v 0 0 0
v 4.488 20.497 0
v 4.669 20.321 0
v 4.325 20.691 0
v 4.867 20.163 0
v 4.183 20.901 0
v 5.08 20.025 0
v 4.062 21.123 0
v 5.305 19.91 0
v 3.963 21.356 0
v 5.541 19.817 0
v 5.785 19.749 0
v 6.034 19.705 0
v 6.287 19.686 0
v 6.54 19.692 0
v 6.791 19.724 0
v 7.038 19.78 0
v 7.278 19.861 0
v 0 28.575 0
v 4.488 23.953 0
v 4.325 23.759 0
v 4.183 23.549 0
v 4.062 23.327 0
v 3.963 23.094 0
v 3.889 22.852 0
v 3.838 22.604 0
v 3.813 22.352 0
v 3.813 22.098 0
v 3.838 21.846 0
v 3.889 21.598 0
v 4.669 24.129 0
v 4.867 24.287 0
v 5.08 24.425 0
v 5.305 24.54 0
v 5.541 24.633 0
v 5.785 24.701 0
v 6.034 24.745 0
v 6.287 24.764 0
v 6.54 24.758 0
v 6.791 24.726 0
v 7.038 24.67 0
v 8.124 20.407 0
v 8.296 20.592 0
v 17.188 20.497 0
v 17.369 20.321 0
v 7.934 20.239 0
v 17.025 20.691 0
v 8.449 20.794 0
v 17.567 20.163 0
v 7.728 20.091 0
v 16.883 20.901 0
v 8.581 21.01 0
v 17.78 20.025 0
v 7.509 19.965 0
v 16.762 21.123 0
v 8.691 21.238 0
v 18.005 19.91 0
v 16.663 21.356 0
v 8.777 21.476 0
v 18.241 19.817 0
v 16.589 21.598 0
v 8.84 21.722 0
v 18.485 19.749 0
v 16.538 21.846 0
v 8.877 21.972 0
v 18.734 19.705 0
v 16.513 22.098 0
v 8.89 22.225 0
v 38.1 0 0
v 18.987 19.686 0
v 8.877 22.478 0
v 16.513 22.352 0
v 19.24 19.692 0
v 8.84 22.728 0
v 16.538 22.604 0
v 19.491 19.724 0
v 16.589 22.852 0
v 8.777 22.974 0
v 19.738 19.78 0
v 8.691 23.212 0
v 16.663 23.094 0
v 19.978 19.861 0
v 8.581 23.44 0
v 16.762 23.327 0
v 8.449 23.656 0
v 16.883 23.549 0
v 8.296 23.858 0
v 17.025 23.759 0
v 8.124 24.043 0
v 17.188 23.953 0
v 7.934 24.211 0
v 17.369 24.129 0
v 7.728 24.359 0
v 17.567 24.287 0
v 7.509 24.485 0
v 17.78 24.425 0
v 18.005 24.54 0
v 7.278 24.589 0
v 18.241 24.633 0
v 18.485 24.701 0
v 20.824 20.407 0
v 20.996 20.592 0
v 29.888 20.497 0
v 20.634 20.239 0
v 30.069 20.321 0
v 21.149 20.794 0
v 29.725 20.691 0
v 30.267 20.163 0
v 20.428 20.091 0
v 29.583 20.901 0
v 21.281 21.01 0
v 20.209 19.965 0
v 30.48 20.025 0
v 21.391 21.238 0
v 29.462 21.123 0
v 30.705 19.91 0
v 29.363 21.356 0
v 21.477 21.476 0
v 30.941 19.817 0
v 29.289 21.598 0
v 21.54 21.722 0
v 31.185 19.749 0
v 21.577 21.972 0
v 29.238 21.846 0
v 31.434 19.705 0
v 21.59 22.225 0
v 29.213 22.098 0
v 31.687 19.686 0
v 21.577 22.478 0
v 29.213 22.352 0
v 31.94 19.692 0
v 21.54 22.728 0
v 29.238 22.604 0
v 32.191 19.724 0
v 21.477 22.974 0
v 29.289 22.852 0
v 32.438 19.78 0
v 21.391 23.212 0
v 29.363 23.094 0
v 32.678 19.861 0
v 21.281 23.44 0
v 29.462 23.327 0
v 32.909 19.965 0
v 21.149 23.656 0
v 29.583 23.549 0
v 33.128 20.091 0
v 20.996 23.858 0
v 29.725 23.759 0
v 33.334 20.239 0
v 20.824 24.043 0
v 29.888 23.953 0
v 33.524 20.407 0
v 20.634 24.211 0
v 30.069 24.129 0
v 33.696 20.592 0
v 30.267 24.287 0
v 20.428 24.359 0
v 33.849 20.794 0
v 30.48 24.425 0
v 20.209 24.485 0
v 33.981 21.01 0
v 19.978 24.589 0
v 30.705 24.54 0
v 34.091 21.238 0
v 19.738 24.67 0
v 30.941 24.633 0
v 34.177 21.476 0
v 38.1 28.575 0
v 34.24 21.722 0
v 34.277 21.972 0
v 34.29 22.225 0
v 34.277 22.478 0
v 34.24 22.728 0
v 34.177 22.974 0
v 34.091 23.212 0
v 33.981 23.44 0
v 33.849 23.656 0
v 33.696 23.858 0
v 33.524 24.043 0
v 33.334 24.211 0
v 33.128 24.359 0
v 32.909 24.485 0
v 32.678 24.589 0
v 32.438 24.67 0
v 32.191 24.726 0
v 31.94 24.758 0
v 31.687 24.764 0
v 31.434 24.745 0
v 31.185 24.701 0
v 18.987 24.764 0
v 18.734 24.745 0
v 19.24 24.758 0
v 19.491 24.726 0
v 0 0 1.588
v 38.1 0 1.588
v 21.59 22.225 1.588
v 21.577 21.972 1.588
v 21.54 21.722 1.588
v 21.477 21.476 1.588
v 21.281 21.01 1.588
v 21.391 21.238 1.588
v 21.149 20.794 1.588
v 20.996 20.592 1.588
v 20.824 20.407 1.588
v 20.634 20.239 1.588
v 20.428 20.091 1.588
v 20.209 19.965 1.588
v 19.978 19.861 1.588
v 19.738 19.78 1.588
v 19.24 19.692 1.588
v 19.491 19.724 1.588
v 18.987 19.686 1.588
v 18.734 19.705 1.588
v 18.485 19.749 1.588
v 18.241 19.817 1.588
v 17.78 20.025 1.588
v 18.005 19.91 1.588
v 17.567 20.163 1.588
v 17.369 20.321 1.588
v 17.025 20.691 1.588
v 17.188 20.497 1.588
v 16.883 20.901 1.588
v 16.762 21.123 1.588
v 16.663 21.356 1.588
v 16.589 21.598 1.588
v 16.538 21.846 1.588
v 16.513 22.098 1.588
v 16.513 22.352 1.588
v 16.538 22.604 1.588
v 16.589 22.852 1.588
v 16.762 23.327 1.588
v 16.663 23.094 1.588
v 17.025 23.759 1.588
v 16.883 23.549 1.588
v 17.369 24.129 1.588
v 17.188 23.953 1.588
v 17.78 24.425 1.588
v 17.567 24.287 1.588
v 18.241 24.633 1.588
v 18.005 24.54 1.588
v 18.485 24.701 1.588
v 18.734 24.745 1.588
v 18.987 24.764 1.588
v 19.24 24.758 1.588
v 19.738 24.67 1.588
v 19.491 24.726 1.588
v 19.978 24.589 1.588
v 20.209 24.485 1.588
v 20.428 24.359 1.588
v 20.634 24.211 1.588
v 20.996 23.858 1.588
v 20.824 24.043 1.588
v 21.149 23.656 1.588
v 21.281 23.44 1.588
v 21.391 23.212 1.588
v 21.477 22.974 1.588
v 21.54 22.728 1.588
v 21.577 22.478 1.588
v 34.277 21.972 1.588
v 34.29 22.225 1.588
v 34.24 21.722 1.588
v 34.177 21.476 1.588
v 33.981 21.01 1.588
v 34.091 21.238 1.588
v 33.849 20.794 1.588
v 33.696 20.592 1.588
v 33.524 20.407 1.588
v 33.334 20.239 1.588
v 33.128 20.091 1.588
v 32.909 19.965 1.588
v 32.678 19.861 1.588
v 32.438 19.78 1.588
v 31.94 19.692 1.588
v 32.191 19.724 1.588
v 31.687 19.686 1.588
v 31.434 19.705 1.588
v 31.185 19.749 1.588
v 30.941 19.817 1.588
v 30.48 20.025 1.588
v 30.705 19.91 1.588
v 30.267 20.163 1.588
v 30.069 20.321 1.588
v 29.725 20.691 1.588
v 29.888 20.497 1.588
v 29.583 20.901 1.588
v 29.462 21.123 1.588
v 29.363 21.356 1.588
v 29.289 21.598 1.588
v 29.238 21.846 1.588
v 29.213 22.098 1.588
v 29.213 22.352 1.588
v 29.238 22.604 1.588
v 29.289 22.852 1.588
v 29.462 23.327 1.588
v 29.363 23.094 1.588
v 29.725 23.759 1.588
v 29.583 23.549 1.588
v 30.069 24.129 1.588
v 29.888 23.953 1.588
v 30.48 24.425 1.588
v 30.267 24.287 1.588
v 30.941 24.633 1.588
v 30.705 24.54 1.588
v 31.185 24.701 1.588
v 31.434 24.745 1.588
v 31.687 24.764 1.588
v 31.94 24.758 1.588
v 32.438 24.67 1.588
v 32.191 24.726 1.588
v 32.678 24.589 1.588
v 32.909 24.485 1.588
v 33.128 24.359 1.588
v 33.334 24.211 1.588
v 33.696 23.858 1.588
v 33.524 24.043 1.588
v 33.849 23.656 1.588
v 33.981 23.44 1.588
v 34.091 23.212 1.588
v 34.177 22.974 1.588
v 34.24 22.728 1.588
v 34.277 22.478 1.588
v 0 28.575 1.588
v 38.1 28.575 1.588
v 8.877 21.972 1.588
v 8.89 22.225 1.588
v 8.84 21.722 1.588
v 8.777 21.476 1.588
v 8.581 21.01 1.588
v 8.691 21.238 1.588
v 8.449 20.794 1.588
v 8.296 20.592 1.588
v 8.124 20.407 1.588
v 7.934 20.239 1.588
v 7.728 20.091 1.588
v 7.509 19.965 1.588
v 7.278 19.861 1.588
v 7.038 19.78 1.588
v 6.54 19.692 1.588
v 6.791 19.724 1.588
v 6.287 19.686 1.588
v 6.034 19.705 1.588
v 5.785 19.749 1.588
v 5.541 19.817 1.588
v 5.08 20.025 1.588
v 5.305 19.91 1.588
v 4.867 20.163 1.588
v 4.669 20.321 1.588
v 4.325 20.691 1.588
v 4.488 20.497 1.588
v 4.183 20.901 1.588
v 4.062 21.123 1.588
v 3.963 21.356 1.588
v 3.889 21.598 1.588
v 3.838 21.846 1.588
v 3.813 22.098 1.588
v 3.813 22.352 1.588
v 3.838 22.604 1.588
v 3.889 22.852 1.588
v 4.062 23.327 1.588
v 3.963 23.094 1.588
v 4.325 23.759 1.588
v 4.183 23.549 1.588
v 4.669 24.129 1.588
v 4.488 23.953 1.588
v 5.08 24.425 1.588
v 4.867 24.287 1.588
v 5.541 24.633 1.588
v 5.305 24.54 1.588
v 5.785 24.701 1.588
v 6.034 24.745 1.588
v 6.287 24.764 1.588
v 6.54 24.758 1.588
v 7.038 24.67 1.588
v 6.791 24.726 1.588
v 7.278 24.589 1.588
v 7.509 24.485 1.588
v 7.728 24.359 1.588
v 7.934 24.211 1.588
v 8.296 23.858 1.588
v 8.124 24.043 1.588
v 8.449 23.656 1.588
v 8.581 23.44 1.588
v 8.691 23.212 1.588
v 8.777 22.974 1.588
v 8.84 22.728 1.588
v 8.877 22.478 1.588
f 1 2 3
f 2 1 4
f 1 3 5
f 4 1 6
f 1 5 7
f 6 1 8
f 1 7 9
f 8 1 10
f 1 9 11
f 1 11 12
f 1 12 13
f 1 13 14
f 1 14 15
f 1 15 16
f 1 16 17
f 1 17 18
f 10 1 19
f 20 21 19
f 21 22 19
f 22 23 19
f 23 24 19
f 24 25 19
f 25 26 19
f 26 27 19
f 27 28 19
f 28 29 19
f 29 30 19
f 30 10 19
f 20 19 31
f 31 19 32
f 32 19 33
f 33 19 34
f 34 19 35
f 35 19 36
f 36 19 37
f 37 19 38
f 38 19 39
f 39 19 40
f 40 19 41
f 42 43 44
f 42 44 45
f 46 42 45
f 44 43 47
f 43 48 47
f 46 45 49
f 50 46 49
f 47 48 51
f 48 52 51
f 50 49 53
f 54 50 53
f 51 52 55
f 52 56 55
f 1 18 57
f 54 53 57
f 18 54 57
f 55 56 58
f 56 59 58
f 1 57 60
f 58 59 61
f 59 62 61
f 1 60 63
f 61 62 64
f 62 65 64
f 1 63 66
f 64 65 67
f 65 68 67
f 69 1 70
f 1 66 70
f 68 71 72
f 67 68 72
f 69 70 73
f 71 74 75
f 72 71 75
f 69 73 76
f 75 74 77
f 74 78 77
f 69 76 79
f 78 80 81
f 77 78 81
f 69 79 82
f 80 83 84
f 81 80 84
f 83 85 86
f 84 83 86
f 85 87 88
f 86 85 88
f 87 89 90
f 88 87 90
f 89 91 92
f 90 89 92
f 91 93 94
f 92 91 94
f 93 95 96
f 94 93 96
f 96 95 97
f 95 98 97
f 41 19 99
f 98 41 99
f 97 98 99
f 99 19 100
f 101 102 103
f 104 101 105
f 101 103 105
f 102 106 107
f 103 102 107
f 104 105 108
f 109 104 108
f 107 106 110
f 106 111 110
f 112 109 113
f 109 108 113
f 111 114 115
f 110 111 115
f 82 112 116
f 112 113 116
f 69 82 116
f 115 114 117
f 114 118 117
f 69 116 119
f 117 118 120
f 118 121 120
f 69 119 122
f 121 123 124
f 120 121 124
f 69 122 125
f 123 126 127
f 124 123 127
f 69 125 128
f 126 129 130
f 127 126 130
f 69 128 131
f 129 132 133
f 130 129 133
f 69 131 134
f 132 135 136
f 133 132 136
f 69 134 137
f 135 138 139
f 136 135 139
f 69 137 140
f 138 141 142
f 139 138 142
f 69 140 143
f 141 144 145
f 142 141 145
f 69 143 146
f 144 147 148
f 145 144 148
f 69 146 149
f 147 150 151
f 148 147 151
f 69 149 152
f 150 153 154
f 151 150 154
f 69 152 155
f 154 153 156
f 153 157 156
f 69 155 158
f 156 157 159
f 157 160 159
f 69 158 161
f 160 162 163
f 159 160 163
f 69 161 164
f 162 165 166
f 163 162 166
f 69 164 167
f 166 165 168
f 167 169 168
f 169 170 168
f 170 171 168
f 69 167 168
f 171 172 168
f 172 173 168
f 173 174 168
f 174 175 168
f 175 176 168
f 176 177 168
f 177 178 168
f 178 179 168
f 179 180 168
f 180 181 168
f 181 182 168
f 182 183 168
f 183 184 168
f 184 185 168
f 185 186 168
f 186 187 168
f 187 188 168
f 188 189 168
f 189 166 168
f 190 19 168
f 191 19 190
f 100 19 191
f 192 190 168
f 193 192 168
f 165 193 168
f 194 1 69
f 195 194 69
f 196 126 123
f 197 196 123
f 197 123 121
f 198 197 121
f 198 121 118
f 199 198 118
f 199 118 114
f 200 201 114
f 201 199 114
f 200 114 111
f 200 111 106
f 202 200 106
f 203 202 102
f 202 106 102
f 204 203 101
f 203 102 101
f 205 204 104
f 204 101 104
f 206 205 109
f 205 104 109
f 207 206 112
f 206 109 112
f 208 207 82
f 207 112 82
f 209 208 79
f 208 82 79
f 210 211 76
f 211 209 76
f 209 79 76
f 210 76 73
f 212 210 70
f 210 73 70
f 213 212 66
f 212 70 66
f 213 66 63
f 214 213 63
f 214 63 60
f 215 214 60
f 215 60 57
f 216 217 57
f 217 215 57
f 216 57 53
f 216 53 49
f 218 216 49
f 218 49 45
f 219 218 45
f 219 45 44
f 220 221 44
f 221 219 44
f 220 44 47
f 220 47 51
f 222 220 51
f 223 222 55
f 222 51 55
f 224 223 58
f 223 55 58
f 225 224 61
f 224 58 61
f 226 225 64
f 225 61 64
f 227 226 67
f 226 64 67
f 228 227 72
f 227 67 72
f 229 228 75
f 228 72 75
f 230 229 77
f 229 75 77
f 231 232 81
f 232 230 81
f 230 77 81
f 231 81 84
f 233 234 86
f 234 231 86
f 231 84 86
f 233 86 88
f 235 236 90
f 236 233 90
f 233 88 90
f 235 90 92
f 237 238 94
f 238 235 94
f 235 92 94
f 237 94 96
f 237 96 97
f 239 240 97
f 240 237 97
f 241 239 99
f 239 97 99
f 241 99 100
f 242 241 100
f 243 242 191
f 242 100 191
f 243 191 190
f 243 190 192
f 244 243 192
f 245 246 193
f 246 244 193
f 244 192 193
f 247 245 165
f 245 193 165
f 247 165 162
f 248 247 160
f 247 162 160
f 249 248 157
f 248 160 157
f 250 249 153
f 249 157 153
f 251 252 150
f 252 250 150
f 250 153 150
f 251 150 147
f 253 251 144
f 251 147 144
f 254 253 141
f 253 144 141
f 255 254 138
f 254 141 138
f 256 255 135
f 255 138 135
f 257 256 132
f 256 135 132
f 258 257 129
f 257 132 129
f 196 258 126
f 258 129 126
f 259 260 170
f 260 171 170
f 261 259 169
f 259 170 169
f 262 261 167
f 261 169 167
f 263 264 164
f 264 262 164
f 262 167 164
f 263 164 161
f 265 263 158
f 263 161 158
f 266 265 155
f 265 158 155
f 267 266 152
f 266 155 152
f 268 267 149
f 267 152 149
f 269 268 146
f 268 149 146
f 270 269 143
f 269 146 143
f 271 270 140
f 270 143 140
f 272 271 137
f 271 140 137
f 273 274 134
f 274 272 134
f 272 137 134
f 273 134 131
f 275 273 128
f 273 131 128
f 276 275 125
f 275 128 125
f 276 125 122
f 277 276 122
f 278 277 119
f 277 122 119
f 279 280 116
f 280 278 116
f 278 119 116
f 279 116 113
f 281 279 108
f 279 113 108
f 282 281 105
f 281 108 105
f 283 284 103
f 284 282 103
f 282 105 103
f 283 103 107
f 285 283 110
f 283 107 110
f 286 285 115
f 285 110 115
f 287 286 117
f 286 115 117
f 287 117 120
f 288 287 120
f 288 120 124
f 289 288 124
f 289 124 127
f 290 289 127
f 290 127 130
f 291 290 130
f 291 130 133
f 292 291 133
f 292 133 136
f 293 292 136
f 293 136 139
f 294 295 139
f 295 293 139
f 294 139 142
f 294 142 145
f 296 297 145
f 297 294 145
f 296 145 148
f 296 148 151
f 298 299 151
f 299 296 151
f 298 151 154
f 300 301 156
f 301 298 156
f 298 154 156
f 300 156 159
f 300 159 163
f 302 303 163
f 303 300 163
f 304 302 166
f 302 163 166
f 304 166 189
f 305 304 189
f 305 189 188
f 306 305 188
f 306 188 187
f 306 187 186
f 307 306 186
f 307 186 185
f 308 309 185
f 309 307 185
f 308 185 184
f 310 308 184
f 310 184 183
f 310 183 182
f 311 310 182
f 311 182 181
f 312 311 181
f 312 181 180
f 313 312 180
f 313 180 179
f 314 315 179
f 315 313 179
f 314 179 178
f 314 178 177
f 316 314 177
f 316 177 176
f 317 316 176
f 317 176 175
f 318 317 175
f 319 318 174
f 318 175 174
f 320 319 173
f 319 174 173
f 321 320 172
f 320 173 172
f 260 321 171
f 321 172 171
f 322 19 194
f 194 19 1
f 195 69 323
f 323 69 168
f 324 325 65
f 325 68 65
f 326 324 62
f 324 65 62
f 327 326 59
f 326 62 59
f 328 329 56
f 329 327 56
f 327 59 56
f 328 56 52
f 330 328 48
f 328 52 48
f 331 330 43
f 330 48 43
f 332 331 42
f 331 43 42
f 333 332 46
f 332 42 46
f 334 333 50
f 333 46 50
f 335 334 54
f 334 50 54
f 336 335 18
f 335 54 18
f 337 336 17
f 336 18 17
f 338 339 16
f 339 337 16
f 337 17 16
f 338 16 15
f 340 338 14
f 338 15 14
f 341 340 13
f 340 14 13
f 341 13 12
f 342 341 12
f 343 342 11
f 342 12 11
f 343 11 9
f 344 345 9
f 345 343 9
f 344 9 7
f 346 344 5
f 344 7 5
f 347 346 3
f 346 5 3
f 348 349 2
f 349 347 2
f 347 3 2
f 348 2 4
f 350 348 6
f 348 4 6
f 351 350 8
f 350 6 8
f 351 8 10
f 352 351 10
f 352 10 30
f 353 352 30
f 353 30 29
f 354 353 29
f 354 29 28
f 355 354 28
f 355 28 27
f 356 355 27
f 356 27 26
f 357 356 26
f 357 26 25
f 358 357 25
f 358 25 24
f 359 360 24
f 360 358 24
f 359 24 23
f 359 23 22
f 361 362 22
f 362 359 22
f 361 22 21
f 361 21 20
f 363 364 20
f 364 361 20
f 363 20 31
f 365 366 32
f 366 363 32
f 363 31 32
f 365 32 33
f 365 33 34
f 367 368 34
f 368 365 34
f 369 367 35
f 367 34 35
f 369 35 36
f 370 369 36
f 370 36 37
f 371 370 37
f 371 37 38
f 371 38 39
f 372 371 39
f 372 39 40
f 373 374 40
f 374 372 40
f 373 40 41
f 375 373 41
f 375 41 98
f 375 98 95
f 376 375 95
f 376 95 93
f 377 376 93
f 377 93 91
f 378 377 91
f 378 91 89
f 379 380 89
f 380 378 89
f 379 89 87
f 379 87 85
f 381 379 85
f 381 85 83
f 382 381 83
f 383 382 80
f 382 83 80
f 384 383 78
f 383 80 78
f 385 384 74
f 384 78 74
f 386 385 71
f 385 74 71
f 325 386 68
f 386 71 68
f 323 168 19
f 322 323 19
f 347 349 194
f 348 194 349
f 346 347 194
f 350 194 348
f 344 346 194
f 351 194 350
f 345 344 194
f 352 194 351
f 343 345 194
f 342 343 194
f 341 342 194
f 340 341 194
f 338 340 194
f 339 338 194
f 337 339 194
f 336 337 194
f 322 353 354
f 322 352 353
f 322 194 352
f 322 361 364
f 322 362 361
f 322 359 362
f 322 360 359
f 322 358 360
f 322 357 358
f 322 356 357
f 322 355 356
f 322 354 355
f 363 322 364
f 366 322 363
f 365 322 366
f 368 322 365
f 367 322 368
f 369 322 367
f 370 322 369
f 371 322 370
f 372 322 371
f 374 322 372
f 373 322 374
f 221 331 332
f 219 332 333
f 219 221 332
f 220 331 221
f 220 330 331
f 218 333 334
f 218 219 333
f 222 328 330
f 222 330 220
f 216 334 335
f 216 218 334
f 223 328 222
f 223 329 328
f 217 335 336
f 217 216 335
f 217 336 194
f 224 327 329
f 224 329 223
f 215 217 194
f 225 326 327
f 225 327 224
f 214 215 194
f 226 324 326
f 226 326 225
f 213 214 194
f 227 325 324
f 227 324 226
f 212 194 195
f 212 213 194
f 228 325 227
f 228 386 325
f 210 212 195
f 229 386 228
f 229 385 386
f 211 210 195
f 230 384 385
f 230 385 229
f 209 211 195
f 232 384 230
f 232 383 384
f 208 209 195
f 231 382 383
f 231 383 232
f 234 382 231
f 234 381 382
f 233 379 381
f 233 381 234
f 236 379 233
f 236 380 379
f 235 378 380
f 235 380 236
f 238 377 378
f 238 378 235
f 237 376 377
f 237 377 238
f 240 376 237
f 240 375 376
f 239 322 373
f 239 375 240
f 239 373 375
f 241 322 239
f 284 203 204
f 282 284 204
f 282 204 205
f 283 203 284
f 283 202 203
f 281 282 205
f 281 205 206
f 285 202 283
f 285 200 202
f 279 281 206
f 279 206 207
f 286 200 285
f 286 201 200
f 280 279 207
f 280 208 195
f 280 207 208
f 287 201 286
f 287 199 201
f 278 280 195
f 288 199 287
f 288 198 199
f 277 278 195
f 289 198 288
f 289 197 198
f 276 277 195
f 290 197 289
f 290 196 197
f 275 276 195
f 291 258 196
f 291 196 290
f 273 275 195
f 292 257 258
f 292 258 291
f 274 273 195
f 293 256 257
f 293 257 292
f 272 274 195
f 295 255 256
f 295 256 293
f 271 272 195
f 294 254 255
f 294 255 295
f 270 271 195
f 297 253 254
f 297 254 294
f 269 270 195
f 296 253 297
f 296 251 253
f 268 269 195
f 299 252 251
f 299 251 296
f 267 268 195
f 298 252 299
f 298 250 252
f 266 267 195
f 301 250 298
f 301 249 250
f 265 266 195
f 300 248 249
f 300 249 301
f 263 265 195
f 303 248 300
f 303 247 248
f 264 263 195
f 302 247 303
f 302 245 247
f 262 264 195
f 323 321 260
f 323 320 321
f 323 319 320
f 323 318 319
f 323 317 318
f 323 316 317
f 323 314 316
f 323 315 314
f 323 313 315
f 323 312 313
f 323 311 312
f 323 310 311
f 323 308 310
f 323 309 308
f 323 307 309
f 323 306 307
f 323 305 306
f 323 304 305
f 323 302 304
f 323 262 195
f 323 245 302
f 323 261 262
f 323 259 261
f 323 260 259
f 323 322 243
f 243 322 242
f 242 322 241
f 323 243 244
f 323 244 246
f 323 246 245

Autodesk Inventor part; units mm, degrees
ref_plane "YZ Plane" through (0, 0, 0) normal (1, 0, 0) x (0, 1, 0)
ref_plane "XZ Plane" through (0, 0, 0) normal (0, 1, 0) x (-1, 0, 0)
ref_plane "XY Plane" through (0, 0, 0) normal (0, 0, 1) x (1, 0, 0)
sketch "Sketch1" plane through (0, 0, 0) normal (0, 0, 1) x (1, 0, 0)
  line L0 (0, 0) -> (38.1, 0)
  line L1 (38.1, 0) -> (38.1, 28.575)
  line L2 (38.1, 28.575) -> (0, 28.575)
  line L3 (0, 28.575) -> (0, 0)
  circle A0 centre (6.35, 22.225) radius 2.54
  circle A1 centre (19.05, 22.225) radius 2.54
  circle A2 centre (31.75, 22.225) radius 2.54
  dimension "d0" = 38.1
  dimension "d1" = 28.575
  dimension "d5" = 5.08
  dimension "d8" = 5.08
  dimension "d9" = 5.08
extrude "Extrusion1" add sketch "Sketch1" along normal blind 1.5875
properties part number "flatPoly3ForCNC"
